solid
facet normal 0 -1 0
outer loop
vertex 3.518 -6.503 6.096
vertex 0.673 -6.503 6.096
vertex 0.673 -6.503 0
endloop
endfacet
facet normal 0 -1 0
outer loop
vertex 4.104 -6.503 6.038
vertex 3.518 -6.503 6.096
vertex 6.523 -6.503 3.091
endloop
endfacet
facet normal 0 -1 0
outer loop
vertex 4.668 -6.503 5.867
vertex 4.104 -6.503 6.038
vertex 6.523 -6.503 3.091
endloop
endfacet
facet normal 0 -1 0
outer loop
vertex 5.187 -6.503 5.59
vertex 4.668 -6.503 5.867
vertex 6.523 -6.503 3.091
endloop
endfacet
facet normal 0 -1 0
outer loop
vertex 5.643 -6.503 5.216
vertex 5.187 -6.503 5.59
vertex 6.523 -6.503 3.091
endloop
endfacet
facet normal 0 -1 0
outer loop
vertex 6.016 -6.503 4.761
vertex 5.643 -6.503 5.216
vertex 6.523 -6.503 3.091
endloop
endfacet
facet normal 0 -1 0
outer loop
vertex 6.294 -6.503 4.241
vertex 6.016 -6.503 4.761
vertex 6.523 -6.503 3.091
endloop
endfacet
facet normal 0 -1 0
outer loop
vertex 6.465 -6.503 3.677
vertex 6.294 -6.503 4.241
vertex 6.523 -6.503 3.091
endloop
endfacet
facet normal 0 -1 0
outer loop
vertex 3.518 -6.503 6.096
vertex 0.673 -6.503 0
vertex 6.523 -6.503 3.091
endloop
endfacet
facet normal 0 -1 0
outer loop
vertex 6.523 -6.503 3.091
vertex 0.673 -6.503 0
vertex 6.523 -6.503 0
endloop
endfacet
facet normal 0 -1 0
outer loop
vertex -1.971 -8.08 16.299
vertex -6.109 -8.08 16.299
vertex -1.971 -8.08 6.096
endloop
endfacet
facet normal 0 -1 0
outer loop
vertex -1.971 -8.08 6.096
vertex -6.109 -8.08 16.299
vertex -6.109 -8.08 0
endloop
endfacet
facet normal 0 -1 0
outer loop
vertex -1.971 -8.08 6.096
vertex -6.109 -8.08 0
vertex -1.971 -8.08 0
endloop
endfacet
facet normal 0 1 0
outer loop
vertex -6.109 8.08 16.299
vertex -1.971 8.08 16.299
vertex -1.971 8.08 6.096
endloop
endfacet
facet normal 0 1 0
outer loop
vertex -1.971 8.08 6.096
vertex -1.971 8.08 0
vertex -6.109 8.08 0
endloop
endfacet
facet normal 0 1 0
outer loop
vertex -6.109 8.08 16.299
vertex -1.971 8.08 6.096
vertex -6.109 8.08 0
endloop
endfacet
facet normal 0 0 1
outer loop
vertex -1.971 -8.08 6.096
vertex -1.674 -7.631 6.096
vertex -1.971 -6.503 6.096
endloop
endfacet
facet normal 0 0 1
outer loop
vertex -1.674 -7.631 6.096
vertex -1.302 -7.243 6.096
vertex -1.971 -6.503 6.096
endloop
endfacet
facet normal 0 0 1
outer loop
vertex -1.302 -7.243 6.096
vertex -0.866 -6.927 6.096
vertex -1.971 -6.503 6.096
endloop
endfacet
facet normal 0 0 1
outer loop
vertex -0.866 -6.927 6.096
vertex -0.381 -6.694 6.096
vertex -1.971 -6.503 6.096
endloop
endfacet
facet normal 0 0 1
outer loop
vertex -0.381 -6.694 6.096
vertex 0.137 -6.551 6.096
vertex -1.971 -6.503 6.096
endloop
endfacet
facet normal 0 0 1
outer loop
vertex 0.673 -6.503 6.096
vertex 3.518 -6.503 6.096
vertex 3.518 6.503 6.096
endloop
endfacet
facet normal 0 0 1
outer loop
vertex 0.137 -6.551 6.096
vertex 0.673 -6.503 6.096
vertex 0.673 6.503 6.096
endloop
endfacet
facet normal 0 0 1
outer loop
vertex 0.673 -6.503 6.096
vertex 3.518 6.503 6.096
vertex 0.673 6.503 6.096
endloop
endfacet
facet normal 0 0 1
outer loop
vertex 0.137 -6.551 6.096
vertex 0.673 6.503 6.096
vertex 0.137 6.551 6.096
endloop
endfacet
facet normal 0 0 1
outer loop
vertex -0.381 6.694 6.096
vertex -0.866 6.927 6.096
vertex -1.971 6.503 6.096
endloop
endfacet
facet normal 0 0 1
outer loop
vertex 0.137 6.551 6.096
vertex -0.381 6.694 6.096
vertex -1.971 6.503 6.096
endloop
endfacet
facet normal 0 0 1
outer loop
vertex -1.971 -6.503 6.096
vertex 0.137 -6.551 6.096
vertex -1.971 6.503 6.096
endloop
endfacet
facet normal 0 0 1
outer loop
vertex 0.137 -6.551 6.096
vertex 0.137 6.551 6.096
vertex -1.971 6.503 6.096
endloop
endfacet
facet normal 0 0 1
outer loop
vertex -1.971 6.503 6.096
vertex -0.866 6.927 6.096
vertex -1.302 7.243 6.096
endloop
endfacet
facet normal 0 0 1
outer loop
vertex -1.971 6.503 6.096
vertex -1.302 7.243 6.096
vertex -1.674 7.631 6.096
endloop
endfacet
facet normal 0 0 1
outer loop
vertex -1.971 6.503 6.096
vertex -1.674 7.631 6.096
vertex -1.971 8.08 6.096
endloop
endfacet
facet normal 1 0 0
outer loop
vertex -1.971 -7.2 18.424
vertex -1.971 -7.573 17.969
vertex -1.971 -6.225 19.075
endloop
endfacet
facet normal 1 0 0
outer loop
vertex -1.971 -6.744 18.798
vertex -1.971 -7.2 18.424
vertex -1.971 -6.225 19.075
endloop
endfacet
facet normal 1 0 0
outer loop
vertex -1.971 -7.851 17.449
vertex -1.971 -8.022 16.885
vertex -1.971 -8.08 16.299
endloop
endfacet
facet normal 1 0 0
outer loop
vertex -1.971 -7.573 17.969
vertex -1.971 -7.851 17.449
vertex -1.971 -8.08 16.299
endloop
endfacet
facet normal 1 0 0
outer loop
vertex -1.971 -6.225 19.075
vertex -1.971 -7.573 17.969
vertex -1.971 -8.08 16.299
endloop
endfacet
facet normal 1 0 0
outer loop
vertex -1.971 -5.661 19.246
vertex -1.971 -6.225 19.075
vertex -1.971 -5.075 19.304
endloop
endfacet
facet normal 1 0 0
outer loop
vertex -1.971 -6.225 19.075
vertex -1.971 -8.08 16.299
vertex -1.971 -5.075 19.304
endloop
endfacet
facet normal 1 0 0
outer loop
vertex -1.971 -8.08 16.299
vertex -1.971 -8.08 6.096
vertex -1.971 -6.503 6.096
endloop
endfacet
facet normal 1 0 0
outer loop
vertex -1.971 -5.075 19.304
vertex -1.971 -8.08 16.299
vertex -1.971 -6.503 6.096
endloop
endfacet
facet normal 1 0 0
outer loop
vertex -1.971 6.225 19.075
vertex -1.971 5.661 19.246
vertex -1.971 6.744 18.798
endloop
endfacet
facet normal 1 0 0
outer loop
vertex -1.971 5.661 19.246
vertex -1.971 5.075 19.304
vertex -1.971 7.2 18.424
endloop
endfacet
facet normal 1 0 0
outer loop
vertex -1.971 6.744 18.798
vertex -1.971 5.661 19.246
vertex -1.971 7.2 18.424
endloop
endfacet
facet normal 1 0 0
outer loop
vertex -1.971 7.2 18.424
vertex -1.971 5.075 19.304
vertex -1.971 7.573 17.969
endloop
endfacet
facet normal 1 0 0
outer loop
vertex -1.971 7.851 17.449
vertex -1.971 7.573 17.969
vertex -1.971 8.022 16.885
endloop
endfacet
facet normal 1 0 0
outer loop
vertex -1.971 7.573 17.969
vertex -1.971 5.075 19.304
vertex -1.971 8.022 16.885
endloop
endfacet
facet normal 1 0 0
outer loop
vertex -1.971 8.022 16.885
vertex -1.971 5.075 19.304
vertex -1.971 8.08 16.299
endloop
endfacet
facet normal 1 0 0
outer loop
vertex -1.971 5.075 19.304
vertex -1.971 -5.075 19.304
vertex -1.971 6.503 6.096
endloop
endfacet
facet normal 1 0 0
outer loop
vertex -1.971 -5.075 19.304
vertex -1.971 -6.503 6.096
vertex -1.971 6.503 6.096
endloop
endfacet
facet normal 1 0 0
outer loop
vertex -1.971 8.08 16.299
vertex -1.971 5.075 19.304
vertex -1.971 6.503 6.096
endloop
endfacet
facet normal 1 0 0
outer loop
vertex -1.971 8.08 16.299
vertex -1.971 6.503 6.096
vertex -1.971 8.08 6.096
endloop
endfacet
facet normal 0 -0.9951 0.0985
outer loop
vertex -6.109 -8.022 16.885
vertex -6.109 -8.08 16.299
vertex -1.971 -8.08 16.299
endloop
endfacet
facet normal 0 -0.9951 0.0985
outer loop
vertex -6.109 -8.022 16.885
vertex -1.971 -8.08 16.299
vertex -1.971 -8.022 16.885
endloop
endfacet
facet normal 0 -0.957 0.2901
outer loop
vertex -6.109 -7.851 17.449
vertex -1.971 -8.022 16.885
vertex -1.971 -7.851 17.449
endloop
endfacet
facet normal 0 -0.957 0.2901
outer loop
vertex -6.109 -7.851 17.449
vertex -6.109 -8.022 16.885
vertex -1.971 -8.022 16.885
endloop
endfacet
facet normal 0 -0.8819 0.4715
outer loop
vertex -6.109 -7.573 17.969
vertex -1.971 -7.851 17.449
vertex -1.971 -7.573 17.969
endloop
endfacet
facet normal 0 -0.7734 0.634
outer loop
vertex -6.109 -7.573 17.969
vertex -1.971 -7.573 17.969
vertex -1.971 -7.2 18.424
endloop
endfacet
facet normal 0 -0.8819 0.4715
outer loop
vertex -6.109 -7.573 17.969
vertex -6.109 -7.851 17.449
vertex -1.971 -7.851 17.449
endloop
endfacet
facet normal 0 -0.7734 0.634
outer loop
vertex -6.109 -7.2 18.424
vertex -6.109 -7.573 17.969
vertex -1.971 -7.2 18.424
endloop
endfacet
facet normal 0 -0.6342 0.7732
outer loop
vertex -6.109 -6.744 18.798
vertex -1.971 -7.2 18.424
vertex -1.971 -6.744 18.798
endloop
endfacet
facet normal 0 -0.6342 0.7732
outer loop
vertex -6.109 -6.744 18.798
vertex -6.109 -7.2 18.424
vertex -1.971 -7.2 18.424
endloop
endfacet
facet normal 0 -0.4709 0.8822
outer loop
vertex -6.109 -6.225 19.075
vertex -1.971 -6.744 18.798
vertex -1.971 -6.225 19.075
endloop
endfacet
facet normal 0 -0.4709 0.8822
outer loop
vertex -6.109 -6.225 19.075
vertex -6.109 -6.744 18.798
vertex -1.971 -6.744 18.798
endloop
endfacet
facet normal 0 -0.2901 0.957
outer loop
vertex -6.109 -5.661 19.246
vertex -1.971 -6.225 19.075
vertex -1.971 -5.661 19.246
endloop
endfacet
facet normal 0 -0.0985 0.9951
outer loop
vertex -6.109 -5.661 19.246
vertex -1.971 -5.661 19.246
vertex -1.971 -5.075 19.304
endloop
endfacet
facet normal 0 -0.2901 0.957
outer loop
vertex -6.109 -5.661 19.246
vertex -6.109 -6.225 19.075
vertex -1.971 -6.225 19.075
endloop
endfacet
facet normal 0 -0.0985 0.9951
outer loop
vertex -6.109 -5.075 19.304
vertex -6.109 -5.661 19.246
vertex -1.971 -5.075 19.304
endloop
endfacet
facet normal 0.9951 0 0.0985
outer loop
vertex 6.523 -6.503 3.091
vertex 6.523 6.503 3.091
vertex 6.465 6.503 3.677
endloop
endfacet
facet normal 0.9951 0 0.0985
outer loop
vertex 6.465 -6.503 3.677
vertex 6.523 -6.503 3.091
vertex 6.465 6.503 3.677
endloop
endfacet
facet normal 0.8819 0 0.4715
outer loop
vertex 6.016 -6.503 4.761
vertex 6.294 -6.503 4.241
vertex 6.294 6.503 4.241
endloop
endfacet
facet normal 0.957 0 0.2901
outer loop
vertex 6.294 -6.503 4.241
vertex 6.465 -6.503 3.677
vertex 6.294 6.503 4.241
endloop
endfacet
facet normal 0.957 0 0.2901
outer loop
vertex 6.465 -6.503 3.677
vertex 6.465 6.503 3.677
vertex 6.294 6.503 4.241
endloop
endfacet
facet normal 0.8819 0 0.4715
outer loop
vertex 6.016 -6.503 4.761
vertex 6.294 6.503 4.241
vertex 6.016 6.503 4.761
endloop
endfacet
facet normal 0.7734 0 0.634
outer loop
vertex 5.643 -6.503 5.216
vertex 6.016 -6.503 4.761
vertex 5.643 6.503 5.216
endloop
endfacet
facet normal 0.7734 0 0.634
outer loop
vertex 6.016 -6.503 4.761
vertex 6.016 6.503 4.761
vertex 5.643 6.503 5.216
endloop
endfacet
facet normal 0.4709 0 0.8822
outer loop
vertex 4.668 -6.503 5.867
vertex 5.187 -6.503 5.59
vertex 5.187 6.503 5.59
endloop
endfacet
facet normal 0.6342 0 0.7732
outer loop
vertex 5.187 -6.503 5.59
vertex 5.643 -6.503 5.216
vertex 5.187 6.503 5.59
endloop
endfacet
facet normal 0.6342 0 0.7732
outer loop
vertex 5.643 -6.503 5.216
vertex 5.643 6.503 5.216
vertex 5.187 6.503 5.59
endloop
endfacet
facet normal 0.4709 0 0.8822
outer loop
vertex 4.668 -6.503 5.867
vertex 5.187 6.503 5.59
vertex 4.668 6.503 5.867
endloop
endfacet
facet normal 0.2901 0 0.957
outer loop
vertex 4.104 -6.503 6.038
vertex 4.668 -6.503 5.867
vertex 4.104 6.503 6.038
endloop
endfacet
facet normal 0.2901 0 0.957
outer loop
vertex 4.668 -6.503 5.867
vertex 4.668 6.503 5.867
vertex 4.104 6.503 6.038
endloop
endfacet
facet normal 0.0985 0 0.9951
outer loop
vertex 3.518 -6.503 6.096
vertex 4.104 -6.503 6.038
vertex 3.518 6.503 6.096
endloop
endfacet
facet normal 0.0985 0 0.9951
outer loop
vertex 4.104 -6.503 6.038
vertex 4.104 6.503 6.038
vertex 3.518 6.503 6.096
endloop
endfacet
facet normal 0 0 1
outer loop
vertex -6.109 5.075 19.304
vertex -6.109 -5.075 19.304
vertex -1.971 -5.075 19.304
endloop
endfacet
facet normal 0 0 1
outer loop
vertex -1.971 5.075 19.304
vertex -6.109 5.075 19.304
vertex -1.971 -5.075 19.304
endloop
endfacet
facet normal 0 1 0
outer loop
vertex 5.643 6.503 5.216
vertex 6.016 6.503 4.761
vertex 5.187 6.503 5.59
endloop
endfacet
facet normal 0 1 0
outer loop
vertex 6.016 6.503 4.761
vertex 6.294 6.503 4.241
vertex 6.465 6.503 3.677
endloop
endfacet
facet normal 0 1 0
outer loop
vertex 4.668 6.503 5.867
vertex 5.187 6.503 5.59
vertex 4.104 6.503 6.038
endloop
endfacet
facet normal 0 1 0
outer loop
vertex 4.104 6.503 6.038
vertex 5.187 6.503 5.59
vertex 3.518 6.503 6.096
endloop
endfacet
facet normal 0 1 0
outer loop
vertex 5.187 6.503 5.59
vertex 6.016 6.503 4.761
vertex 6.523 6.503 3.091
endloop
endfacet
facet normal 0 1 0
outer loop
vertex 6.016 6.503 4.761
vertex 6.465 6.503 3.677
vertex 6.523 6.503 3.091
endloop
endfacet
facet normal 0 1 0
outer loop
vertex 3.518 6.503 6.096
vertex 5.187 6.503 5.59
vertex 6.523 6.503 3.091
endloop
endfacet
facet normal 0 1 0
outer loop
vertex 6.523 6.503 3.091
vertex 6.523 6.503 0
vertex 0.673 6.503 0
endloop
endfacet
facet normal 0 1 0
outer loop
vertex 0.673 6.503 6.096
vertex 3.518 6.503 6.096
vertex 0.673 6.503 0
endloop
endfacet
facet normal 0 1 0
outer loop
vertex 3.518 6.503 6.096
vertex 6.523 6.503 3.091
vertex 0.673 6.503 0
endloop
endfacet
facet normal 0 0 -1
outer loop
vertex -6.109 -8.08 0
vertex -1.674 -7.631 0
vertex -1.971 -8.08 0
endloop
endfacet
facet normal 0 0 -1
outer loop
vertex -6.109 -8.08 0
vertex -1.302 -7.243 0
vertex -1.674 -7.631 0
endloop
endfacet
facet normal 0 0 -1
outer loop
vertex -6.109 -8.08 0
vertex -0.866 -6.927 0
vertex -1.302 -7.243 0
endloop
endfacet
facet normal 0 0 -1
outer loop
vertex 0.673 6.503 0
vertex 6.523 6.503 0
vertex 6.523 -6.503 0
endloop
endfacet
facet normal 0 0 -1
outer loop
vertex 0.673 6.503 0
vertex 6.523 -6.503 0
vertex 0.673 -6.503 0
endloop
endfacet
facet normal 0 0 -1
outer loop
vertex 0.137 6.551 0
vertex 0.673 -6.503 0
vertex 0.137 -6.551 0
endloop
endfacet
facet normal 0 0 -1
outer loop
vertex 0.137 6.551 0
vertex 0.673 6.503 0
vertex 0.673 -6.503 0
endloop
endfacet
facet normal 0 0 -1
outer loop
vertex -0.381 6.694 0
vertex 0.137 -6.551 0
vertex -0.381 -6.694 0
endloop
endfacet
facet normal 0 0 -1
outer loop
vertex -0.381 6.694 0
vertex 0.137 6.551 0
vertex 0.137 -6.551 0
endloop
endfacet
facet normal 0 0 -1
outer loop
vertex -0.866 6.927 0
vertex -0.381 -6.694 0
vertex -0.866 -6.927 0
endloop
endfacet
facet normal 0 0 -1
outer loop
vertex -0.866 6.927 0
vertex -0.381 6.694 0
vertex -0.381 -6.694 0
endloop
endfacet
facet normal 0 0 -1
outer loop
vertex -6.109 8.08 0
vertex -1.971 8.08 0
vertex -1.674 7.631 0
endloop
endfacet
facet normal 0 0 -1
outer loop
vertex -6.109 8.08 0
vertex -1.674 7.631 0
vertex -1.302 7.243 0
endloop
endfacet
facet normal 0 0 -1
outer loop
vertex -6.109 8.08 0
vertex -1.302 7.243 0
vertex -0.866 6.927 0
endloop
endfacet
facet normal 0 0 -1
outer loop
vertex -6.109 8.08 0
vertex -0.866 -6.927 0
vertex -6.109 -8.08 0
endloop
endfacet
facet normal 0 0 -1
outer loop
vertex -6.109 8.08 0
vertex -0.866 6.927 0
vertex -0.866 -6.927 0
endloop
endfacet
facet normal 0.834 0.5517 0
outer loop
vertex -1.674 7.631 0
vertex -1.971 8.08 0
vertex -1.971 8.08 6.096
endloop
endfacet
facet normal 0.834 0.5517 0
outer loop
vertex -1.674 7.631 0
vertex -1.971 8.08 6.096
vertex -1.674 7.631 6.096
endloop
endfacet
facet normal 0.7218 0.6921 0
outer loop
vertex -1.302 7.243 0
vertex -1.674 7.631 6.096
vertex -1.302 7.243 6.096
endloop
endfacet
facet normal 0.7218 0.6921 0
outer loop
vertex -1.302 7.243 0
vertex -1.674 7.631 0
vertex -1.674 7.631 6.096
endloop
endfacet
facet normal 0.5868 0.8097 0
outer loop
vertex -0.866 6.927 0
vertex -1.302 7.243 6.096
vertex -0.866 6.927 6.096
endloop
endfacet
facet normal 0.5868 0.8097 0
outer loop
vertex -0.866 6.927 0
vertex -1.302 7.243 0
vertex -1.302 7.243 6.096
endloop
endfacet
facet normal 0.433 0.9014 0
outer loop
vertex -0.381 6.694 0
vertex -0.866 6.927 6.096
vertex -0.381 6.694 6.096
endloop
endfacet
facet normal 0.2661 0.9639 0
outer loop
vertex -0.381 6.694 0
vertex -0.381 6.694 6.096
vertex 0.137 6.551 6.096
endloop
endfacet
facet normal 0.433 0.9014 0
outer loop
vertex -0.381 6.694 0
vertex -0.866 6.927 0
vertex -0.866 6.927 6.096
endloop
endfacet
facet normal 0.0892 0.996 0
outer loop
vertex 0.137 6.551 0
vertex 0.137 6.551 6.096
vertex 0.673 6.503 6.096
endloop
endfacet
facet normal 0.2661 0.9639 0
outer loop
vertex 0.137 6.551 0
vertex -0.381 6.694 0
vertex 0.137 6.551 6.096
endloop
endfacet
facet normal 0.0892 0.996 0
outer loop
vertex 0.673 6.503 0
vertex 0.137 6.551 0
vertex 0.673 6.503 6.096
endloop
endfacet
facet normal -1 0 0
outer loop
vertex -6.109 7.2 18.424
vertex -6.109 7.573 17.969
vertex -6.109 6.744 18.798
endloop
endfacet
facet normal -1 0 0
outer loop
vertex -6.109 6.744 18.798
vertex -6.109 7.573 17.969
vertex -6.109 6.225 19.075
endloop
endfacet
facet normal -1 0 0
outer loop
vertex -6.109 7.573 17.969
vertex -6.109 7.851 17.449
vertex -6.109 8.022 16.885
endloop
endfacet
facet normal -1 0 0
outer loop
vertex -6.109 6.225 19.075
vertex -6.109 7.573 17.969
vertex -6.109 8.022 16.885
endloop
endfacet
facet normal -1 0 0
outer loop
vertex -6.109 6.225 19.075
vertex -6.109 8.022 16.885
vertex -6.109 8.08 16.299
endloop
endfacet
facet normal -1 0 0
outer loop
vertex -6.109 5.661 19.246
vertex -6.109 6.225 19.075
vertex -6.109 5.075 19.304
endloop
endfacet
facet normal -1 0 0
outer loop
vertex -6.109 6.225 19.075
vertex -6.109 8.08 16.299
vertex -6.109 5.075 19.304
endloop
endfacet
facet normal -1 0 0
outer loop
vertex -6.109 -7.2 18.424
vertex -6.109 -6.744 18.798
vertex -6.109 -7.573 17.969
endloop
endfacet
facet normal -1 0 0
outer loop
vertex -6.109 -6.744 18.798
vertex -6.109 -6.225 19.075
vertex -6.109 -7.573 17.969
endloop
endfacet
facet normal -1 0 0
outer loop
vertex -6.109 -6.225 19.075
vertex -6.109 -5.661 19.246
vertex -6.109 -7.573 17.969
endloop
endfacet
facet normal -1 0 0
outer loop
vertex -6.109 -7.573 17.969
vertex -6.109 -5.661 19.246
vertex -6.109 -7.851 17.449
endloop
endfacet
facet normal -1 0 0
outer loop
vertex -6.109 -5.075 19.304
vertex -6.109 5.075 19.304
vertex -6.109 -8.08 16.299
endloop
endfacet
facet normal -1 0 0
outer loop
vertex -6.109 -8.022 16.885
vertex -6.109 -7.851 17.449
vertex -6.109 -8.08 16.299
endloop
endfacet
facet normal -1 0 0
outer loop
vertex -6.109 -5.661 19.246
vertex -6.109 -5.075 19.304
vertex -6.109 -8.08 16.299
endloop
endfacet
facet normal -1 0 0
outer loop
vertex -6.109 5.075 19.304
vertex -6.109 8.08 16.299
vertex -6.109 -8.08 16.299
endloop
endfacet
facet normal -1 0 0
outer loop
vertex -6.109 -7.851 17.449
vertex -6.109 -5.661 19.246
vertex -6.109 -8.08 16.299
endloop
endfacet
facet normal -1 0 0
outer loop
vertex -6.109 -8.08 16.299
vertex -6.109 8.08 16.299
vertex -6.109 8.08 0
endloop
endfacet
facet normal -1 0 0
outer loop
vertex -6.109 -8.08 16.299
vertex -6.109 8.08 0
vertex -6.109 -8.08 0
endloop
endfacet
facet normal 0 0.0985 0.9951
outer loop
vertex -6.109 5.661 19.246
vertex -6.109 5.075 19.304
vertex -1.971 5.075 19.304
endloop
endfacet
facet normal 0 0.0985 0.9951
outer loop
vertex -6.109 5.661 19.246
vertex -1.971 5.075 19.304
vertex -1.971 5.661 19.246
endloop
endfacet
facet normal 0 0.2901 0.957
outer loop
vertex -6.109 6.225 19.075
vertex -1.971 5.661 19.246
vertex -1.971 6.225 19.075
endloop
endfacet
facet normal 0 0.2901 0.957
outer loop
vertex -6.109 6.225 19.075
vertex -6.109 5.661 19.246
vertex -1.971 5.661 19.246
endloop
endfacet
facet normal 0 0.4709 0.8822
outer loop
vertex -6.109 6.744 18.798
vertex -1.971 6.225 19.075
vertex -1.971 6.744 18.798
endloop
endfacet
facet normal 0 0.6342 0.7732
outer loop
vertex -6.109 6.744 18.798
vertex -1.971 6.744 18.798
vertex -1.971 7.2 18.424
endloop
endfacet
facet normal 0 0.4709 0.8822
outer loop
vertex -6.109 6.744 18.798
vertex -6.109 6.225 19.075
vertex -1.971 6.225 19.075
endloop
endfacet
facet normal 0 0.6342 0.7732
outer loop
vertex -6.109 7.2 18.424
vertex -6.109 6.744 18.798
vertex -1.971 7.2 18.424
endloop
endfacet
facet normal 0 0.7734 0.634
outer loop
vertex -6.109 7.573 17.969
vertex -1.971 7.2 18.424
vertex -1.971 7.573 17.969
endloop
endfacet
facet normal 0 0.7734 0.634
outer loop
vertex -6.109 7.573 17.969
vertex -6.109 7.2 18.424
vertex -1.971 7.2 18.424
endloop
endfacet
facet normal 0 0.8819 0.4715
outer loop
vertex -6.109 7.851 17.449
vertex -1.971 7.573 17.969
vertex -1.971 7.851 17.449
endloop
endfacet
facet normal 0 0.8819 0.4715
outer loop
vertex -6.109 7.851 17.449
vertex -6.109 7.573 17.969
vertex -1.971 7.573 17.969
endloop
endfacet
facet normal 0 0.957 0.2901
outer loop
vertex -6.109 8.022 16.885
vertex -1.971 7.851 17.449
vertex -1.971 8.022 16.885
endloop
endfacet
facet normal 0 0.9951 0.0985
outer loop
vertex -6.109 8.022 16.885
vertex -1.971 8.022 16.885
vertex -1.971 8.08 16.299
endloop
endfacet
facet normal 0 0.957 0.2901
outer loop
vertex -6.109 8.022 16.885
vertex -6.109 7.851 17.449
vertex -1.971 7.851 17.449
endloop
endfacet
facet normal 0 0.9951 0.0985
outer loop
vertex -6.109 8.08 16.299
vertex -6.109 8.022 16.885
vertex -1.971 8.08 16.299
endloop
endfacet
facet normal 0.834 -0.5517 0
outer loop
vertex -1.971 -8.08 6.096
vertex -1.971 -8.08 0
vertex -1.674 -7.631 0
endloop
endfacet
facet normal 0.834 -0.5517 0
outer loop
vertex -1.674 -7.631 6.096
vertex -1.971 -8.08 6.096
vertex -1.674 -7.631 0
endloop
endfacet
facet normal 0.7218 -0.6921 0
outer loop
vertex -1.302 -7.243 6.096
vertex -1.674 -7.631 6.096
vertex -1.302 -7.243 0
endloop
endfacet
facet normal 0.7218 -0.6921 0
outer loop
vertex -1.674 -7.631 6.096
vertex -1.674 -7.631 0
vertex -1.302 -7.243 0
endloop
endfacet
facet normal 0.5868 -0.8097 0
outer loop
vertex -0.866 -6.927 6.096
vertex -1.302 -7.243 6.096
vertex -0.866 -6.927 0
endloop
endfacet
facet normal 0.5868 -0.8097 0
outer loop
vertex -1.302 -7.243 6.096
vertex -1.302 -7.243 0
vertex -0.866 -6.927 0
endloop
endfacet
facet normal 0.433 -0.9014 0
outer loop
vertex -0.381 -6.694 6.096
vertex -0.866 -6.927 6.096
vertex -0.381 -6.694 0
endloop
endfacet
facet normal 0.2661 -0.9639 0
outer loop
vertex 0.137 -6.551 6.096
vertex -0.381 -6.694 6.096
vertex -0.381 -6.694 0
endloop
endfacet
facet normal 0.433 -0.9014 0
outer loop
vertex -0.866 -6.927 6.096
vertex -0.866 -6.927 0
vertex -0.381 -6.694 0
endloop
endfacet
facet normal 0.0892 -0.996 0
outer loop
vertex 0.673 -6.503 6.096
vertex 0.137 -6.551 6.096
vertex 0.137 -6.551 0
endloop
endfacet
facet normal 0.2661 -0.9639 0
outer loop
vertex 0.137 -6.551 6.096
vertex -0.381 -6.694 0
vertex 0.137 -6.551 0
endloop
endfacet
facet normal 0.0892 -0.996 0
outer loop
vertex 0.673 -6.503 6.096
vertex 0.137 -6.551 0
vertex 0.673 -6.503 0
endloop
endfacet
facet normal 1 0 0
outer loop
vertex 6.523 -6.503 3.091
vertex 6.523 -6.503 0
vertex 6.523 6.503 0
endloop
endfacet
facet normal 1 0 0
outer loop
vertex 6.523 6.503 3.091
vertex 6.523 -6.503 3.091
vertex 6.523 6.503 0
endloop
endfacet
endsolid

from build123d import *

# Parameters (mm, degrees)
F1_DEPTH    = 19.304
F0_W        = 4.2467024177
F0_H        = 13.0065511912
F2_DEPTH    = 6.096
F3_T1_DEPTH = 6.096
F3_T3_DEPTH = 6.096
F3_T5_DEPTH = 19.1620992743
F3_T7_DEPTH = 19.1620992743
F3_T9_DEPTH = 28.0302021899


# Not quite as in the source:
# - a fillet or chamfer that OpenCascade refuses, or shapes differently, is made with other operations: its cross-section is extruded or revolved along the edge and cut away or added


with BuildPart() as f1:
    # F0 (on Top) → F1 (new body)
    with BuildSketch(Plane.XY):
        Polygon((-6.1091380194, 8.0798277631), (-6.1091380194, 0), (-6.1091380194, -8.0798277631), (-1.9706897438, -8.0798277631), (-1.9706897438, -6.5032755956), (-1.9706897438, 6.5032755956), (-1.9706897438, 8.0798277631), align=None)
    extrude(amount=F1_DEPTH)

    # F0 (on Top) → F2 (join)
    with BuildSketch(Plane.XY):
        with Locations((0.1526614651, 0)):
            Rectangle(F0_W, F0_H)
        with Locations((4.3993638828, 0)):
            Rectangle(F0_W, F0_H)
    extrude(amount=F2_DEPTH)

    # F3: fillet of radius 3.0047301997 on 5 edges, made by hand

    # F3_s2 → F3_t1 (join)
    with BuildSketch(Plane.XY):
        with BuildLine():
            ThreePointArc((-1.9706897438, -8.0798277631), (-0.8660843797, -6.9273379324), (0.6729273014, -6.5032755956))
            Line((0.6729273014, -6.5032755956), (-1.9706897438, -6.5032755956))
            Line((-1.9706897438, -6.5032755956), (-1.9706897438, -8.0798277631))
        make_face()
    extrude(amount=F3_T1_DEPTH)

    # F3_s4 → F3_t3 (join)
    with BuildSketch(Plane.XY):
        with BuildLine():
            ThreePointArc((-1.9706897438, 8.0798277631), (-0.8660843797, 6.9273379324), (0.6729273014, 6.5032755956))
            Line((0.6729273014, 6.5032755956), (-1.9706897438, 6.5032755956))
            Line((-1.9706897438, 6.5032755956), (-1.9706897438, 8.0798277631))
        make_face()
    extrude(amount=F3_T3_DEPTH)

    # F3_s6 → F3_t5 (cut)
    with BuildSketch(Plane.YZ.offset(-13.6209635187)):
        with BuildLine():
            ThreePointArc((5.0750975634, 19.304), (7.1997626633, 18.4239349001), (8.0798277631, 16.2992698003))
            Line((8.0798277631, 16.2992698003), (8.0798277631, 19.304))
            Line((8.0798277631, 19.304), (5.0750975634, 19.304))
        make_face()
    extrude(amount=F3_T5_DEPTH, mode=Mode.SUBTRACT)

    # F3_s8 → F3_t7 (cut)
    with BuildSketch(Plane.YZ.offset(-13.6209635187)):
        with BuildLine():
            ThreePointArc((-8.0798277631, 16.2992698003), (-7.1997626633, 18.4239349001), (-5.0750975634, 19.304))
            Line((-5.0750975634, 19.304), (-8.0798277631, 19.304))
            Line((-8.0798277631, 19.304), (-8.0798277631, 16.2992698003))
        make_face()
    extrude(amount=F3_T7_DEPTH, mode=Mode.SUBTRACT)

    # F3_s10 → F3_t9 (cut)
    with BuildSketch(Plane.XZ.offset(-14.0151010949)):
        with BuildLine():
            ThreePointArc((6.5227150917, 3.0912698003), (5.6426499918, 5.2159349001), (3.517984892, 6.096))
            Line((3.517984892, 6.096), (6.5227150917, 6.096))
            Line((6.5227150917, 6.096), (6.5227150917, 3.0912698003))
        make_face()
    extrude(amount=F3_T9_DEPTH, mode=Mode.SUBTRACT)


solid = f1.part
